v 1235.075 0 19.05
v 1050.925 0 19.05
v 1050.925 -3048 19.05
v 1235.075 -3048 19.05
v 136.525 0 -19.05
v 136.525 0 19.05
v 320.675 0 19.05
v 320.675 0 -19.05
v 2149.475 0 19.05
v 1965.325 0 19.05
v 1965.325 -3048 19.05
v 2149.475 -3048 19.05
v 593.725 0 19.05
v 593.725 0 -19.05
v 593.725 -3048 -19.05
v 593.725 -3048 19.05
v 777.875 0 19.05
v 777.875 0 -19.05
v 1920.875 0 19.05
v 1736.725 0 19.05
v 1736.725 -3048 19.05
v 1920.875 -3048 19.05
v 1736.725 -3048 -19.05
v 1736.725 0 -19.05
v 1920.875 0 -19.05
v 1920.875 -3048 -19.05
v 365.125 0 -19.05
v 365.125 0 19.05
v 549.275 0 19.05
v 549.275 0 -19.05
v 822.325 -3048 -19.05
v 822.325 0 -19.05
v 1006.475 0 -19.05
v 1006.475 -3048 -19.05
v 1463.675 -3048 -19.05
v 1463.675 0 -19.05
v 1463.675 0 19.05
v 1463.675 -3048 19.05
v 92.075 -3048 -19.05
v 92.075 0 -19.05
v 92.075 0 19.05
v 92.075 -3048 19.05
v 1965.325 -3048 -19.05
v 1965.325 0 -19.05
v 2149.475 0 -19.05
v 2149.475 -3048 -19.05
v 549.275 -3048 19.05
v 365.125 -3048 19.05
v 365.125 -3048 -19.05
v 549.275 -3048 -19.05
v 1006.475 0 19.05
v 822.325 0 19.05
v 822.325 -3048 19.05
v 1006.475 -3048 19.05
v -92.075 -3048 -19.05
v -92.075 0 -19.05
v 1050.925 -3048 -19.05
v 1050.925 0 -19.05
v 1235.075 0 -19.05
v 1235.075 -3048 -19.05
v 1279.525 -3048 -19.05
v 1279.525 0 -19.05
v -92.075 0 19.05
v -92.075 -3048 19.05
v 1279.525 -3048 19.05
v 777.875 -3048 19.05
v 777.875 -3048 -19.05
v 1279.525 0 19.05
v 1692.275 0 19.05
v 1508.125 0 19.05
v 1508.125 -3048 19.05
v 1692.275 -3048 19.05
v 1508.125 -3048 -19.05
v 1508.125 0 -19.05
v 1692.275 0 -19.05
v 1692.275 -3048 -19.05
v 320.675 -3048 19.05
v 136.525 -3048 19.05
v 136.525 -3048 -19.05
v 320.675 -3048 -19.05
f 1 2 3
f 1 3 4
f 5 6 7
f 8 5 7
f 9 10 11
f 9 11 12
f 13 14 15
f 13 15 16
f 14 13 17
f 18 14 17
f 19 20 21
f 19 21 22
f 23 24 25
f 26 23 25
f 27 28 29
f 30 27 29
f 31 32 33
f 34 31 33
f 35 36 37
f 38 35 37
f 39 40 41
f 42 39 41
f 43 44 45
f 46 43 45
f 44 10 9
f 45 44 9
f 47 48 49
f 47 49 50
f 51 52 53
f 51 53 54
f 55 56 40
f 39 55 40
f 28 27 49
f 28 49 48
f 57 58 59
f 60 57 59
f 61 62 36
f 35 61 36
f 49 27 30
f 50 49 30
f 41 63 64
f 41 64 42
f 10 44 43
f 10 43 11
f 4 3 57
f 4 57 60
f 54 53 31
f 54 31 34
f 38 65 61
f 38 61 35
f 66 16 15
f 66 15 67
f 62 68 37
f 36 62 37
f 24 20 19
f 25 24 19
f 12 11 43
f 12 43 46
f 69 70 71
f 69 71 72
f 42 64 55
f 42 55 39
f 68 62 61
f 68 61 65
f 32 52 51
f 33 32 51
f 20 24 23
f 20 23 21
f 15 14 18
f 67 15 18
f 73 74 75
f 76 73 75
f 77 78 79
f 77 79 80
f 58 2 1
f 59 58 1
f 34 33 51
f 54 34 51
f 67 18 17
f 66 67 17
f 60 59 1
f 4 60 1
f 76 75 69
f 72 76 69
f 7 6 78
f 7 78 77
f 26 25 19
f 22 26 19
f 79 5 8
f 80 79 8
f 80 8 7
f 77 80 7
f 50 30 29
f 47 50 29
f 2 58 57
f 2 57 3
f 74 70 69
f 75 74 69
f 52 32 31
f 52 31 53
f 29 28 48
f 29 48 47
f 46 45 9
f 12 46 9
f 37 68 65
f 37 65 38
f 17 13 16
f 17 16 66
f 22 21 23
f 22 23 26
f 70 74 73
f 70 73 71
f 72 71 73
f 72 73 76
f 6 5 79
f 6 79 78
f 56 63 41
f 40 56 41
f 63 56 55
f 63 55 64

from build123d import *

# Parameters (mm, degrees)
F0_W     = 184.15
F0_H     = 38.1
F1_DEPTH = 3048


with BuildPart() as f1:
    # F0 (on Front) → F1 (new body)
    with BuildSketch(Plane.XZ):
        with Locations((228.6, 0)):
            Rectangle(F0_W, F0_H)
        with Locations((457.2, 0)):
            Rectangle(F0_W, F0_H)
        with Locations((685.8, 0)):
            Rectangle(F0_W, F0_H)
        with Locations((914.4, 0)):
            Rectangle(F0_W, F0_H)
        with Locations((1143, 0)):
            Rectangle(F0_W, F0_H)
        with Locations((1371.6, 0)):
            Rectangle(F0_W, F0_H)
        with Locations((1600.2, 0)):
            Rectangle(F0_W, F0_H)
        with Locations((1828.8, 0)):
            Rectangle(F0_W, F0_H)
        with Locations((2057.4, 0)):
            Rectangle(F0_W, F0_H)
        Rectangle(F0_W, F0_H)
    extrude(amount=F1_DEPTH)


solid = f1.part
